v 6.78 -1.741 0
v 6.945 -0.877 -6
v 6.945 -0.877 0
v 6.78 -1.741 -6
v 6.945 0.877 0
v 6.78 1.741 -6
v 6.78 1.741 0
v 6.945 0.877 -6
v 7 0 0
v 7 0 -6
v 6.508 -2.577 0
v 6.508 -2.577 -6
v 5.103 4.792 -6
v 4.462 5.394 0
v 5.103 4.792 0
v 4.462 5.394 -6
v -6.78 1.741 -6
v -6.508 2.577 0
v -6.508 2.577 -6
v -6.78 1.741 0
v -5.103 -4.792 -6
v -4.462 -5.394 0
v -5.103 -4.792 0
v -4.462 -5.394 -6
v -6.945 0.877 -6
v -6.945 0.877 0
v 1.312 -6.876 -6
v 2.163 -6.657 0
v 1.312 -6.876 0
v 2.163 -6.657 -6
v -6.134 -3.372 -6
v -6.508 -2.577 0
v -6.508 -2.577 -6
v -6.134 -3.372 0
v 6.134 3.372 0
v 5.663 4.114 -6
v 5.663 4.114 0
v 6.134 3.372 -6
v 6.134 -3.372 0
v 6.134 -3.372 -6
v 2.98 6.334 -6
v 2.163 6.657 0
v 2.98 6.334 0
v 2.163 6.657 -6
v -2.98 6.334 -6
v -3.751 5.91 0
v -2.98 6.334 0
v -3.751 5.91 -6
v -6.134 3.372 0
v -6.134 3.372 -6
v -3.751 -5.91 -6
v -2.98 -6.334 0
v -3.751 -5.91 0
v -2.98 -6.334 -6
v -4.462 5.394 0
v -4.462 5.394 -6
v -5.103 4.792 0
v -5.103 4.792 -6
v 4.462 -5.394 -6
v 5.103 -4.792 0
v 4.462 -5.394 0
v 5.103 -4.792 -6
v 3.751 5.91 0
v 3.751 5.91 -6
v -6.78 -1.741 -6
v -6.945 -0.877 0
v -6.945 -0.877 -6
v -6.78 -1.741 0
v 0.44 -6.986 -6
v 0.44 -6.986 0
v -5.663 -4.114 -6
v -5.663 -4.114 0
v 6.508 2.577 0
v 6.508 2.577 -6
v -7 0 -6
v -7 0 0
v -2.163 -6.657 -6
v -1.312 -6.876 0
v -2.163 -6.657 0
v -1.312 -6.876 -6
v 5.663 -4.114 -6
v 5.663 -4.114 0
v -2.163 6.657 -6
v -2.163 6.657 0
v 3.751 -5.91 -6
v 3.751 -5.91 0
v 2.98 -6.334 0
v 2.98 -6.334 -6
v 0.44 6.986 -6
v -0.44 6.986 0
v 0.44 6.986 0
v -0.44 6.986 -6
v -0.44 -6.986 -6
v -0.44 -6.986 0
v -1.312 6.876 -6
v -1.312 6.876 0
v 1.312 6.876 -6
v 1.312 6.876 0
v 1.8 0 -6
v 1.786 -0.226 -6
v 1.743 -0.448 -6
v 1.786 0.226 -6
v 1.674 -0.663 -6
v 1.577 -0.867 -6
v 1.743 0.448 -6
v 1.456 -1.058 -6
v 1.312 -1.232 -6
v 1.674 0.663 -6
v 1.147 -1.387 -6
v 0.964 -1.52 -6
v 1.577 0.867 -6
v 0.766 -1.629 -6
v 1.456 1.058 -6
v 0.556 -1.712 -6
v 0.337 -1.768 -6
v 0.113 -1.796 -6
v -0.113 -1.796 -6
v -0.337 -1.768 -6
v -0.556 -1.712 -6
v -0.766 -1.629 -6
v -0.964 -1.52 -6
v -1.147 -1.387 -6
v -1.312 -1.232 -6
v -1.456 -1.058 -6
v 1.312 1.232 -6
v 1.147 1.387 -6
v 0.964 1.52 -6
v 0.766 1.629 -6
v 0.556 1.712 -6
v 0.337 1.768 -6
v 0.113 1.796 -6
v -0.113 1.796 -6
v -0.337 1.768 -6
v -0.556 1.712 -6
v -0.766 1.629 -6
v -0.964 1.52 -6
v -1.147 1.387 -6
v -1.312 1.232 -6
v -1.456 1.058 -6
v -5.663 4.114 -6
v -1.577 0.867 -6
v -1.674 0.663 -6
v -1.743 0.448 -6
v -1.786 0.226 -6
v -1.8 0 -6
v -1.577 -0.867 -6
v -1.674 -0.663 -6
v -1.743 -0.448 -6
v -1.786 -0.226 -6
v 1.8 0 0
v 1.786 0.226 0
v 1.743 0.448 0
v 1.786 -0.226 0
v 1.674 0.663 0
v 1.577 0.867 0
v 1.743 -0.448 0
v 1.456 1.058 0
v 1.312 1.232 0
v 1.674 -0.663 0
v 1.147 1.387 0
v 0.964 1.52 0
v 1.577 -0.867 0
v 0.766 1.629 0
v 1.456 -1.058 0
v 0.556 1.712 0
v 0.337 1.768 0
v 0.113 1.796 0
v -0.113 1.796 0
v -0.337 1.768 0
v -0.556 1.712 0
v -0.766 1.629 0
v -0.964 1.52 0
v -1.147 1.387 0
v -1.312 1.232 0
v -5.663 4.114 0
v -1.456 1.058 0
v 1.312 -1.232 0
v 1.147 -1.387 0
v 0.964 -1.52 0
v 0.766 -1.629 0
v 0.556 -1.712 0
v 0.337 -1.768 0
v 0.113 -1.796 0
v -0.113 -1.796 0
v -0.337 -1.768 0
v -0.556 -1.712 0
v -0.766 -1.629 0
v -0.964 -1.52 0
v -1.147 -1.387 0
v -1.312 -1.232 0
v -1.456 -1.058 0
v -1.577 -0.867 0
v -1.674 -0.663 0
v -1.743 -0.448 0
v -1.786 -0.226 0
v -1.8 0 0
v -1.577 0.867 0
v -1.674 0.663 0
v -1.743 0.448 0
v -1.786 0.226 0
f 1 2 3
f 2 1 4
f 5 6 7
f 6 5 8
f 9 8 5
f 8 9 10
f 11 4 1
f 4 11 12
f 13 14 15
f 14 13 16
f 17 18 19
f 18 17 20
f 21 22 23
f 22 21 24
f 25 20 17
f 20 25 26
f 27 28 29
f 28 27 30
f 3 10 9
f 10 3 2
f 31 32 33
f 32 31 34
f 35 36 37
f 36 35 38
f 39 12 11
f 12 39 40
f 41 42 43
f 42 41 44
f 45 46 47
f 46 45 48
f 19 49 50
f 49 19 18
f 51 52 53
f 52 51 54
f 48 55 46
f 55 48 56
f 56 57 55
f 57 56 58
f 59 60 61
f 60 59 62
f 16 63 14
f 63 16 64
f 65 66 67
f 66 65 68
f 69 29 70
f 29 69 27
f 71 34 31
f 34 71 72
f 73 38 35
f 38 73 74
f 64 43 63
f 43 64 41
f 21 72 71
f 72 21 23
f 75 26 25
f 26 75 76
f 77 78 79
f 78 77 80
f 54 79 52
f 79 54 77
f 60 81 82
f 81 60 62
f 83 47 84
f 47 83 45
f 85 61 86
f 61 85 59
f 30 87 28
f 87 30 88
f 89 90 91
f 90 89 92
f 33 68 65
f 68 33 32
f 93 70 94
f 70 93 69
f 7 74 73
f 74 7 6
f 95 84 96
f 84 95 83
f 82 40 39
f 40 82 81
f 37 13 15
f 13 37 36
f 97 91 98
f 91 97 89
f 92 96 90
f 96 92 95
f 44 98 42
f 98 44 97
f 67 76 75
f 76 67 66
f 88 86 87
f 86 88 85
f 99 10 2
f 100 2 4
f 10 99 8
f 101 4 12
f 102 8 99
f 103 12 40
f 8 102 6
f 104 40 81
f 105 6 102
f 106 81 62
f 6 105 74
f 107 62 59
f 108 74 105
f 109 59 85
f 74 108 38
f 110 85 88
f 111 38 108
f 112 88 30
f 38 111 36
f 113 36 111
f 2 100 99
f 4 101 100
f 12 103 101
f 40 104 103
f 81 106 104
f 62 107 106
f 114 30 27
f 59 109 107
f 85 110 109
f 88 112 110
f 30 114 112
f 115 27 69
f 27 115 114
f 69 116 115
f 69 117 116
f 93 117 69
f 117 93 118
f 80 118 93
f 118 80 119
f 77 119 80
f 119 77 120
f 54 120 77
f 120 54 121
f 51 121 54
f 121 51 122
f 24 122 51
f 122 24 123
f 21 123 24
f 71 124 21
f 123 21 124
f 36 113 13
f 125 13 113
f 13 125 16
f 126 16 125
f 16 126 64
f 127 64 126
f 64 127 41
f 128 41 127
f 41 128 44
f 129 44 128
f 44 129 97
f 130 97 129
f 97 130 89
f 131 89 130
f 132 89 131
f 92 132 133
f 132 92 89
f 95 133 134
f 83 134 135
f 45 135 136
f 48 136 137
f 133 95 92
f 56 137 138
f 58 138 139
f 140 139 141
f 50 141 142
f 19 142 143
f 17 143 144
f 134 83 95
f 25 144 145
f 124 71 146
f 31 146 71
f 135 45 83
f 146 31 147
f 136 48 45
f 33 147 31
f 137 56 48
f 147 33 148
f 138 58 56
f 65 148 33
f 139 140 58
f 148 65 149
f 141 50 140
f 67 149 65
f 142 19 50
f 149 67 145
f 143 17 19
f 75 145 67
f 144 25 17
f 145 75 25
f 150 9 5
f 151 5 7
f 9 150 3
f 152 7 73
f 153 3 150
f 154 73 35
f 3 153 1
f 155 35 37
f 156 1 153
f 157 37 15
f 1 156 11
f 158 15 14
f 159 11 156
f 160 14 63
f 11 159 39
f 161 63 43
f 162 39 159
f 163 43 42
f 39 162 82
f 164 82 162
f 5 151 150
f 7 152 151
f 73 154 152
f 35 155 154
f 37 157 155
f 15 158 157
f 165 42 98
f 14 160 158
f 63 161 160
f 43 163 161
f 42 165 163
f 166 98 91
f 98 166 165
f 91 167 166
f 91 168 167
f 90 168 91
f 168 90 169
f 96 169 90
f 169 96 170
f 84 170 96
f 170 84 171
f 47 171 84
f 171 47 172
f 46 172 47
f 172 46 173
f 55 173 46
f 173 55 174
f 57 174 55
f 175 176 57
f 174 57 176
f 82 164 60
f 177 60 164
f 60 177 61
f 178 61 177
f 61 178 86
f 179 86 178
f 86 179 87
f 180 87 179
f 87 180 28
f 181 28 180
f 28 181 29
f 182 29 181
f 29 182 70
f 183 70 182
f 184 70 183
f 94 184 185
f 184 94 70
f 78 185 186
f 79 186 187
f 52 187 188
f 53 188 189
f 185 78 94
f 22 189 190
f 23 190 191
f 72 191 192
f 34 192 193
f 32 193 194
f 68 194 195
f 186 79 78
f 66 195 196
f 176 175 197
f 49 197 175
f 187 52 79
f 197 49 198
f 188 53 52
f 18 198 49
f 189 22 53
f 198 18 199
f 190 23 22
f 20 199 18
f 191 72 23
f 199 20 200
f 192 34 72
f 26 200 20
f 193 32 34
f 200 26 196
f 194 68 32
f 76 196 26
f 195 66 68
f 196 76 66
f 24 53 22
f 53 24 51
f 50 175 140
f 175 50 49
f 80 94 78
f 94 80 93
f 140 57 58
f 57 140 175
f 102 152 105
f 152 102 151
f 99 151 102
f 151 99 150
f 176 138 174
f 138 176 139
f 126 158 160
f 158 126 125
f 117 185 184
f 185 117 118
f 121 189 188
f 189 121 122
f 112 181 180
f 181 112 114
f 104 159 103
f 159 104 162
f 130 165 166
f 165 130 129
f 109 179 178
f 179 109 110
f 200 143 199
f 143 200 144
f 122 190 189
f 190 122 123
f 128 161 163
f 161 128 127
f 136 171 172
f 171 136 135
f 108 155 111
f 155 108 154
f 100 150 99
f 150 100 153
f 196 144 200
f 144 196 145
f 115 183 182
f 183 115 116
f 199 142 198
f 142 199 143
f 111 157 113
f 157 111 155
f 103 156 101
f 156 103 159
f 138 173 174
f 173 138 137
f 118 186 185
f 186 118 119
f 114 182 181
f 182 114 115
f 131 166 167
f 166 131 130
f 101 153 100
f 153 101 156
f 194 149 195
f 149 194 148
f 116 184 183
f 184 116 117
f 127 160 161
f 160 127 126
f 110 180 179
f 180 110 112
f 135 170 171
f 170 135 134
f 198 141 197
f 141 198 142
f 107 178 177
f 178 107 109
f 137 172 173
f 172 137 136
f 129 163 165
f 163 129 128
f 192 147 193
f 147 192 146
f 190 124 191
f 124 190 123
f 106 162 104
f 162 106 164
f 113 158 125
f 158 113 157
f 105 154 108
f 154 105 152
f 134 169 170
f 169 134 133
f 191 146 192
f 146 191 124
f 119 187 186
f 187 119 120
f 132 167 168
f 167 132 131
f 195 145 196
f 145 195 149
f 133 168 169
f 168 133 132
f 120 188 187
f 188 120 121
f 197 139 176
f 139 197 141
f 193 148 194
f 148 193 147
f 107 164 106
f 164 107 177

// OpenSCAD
$fn = 50;


difference() {
	union() {
		translate(v = [0, 0, -6.0000000000]) {
			cylinder(h = 6, r = 7.0000000000);
		}
		cylinder(h = 0, r = 16.0000000000);
	}
	union() {
		#translate(v = [0, 0, -6]) {
			cylinder(h = 6, r = 1.8000000000);
		}
	}
}
